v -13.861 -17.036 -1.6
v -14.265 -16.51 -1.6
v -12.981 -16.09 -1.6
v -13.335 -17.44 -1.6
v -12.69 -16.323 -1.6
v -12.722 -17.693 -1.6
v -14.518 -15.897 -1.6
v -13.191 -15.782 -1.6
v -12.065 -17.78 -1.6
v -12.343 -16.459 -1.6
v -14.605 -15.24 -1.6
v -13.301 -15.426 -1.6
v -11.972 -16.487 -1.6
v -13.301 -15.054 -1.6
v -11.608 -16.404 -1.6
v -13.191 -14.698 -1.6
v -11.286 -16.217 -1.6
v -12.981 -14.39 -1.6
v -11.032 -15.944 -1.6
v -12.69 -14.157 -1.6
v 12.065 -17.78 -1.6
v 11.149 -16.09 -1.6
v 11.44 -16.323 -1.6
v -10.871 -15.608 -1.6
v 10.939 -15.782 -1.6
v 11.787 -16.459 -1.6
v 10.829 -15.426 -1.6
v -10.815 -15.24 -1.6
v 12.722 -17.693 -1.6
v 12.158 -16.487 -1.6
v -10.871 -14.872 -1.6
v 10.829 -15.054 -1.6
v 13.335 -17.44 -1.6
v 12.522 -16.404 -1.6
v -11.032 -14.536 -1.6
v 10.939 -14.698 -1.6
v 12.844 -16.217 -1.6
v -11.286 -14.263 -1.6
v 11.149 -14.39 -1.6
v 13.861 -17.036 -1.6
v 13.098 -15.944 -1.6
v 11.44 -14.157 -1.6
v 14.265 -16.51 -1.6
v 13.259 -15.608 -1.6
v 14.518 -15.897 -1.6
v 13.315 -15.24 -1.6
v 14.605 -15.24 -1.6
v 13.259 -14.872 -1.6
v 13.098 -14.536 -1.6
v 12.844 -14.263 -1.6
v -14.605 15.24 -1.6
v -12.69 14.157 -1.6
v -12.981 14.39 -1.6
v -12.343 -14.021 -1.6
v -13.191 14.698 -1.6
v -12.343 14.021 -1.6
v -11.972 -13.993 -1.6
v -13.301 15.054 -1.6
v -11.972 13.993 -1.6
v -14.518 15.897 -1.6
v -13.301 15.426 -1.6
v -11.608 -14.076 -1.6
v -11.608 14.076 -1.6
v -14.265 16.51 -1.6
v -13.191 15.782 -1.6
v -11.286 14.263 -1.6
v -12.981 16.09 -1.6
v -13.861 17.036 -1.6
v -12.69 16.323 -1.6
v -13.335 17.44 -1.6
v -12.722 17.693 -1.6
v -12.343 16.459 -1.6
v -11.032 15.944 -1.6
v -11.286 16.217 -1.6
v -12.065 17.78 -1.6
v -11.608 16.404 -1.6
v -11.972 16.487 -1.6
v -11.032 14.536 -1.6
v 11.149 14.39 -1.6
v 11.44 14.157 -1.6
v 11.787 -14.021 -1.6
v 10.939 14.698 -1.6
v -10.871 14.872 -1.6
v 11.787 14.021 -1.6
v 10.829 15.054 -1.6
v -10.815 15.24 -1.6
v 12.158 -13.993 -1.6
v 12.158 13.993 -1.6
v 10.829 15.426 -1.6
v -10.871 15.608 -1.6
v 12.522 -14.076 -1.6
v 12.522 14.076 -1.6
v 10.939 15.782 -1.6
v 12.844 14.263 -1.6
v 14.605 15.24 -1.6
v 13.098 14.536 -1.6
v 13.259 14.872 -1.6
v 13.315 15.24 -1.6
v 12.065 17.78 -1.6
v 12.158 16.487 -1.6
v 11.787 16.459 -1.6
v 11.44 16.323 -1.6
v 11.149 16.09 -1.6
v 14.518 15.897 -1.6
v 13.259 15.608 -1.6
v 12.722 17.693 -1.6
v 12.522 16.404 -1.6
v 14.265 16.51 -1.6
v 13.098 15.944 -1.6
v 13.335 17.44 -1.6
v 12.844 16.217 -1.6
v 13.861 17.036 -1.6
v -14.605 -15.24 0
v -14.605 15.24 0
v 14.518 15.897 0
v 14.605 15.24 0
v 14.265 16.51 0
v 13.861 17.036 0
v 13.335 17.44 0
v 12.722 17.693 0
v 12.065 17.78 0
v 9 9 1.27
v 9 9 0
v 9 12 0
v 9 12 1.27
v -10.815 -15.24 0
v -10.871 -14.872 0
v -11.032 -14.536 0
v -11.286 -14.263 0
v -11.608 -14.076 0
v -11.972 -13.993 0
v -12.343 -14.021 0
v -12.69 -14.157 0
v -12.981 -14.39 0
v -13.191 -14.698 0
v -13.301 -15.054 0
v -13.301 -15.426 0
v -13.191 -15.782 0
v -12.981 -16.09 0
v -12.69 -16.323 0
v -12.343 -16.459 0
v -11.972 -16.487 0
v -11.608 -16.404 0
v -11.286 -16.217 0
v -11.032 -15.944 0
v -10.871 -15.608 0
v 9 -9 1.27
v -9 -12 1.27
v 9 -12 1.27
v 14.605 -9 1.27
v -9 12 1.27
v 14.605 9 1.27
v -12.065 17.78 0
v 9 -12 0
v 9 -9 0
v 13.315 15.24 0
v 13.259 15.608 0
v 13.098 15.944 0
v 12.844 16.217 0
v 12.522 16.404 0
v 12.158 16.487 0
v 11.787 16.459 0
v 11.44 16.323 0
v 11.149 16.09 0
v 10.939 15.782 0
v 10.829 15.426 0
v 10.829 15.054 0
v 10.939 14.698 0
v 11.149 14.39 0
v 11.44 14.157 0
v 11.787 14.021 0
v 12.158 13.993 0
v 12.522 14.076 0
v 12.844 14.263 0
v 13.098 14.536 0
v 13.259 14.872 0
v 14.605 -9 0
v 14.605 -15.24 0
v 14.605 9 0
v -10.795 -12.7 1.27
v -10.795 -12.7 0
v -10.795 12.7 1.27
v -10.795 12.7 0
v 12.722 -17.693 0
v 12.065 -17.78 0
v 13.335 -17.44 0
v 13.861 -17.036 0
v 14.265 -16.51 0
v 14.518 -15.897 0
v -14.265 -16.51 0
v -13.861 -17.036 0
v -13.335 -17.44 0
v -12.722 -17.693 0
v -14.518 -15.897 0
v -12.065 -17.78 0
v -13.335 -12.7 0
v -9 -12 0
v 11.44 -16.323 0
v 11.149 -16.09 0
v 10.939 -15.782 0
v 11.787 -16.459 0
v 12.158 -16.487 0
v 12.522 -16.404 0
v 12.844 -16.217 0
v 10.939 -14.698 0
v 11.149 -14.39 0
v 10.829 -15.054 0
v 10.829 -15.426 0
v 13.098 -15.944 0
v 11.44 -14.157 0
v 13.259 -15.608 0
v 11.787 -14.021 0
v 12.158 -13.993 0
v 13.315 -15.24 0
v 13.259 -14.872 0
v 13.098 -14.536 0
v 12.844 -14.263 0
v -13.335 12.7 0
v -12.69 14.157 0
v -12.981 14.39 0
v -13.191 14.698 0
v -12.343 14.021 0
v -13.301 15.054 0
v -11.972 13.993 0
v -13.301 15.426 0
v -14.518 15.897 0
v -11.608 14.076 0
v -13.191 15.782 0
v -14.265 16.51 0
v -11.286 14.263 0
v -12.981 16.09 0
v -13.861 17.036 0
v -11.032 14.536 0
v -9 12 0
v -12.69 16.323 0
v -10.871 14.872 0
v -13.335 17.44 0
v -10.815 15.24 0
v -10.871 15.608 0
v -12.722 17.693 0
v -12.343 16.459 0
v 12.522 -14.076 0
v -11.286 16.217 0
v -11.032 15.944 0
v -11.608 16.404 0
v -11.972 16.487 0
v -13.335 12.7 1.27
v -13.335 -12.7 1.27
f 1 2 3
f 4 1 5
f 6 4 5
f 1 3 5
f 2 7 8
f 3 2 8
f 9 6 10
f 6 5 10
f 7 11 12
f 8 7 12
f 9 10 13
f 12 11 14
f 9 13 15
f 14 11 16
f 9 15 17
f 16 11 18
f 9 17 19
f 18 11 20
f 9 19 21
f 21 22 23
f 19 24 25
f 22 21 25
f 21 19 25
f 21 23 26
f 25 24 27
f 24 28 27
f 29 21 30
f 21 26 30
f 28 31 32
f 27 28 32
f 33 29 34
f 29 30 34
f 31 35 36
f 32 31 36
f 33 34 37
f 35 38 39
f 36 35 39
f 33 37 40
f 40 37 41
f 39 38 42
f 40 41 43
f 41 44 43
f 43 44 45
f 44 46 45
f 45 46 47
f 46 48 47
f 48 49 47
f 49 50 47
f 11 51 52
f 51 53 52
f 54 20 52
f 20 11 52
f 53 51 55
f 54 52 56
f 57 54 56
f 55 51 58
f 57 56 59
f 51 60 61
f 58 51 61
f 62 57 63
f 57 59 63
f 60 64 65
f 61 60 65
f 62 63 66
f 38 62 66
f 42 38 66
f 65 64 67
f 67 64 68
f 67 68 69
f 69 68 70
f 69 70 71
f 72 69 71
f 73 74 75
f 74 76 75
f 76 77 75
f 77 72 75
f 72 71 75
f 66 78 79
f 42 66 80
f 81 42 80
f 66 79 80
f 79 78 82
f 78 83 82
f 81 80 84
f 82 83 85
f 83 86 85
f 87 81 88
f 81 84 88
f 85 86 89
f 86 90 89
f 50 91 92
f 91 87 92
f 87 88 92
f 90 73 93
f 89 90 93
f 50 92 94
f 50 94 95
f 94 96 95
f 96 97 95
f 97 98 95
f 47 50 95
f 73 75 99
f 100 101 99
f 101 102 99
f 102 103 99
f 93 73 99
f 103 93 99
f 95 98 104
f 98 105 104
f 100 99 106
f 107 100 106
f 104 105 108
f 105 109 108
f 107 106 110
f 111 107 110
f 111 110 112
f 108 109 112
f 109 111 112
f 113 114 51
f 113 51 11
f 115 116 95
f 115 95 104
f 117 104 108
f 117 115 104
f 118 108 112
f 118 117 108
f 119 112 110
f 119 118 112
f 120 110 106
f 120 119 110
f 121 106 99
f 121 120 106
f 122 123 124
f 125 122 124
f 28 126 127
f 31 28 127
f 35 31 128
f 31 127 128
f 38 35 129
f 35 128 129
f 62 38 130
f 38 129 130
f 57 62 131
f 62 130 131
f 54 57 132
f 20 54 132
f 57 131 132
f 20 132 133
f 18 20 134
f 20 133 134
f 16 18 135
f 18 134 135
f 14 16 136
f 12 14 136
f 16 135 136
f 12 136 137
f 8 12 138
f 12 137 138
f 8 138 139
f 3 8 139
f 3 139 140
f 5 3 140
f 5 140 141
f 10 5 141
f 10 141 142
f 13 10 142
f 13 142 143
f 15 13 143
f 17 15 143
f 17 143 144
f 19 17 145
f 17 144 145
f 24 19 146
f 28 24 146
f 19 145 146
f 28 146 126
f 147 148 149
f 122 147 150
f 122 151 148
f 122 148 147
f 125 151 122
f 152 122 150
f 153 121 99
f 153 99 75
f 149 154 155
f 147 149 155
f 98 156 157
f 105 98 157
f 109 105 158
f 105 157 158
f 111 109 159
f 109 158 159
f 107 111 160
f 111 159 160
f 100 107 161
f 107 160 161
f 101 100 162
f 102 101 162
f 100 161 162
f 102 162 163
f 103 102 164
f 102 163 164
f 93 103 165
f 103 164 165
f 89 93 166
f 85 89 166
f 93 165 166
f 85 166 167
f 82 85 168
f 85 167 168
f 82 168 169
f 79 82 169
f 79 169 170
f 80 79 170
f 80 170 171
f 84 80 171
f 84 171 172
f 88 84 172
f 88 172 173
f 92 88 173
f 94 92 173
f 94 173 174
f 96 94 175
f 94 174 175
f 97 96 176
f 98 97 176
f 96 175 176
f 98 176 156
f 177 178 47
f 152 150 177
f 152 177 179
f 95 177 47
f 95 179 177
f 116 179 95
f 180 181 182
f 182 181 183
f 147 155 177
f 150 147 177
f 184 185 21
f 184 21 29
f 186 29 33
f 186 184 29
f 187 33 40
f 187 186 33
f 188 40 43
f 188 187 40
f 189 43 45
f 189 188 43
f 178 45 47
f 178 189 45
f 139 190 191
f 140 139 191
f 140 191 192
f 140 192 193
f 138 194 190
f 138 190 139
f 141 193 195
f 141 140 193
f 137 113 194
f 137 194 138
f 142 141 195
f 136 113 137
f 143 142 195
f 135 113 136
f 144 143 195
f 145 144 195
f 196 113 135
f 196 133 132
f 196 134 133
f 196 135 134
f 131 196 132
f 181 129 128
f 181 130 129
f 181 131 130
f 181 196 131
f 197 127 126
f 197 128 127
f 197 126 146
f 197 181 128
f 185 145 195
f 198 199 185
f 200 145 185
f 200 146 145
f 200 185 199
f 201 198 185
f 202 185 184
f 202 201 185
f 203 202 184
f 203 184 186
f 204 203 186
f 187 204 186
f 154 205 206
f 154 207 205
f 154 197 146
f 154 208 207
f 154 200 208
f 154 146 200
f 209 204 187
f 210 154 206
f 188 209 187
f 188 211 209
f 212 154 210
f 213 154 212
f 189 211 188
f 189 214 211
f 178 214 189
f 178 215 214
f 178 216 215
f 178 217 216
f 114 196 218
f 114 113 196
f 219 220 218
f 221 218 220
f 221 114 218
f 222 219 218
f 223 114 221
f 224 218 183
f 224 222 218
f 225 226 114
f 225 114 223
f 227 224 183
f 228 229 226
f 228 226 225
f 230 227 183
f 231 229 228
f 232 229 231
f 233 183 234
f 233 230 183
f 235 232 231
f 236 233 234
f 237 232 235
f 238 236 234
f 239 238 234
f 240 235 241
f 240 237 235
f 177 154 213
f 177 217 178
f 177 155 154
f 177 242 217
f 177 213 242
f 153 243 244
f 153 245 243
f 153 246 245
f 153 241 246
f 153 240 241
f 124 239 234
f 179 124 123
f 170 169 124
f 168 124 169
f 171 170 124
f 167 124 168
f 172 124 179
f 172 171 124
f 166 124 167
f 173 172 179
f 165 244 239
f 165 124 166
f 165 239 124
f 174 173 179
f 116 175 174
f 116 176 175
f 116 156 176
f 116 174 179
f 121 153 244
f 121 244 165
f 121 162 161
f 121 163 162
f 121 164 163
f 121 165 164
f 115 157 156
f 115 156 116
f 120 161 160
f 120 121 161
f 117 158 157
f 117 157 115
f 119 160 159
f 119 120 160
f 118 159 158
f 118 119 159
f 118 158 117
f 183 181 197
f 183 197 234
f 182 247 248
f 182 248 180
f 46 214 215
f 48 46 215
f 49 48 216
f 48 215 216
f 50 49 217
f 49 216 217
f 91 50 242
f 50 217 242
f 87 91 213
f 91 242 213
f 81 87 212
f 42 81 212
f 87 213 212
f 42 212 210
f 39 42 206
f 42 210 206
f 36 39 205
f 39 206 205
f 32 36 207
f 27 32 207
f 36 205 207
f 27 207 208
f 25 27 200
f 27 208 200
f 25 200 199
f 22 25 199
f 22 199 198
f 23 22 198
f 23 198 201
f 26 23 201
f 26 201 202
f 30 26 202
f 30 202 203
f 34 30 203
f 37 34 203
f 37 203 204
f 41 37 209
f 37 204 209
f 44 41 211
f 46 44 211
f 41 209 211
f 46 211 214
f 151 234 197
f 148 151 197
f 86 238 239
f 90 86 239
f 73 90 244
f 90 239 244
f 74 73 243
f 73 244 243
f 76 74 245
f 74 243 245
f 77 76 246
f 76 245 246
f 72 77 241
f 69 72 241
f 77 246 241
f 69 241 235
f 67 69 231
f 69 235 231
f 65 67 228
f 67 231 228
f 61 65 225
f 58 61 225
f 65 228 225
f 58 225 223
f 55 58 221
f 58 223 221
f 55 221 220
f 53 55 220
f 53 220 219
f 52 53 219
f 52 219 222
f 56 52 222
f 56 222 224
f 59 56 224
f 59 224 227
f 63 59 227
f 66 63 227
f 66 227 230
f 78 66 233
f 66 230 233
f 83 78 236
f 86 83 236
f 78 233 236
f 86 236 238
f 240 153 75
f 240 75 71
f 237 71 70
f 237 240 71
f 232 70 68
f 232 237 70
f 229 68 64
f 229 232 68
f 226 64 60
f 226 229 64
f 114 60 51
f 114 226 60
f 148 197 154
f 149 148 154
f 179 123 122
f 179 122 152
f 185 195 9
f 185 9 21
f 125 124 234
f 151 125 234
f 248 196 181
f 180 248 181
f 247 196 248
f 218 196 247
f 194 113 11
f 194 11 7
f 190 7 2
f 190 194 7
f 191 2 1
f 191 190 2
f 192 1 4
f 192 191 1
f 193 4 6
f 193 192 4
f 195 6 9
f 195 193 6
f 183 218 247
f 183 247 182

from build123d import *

# Parameters (mm, degrees)
F0_R     = 1.25
F1_DEPTH = 1.6
F2_W     = 2.54
F2_H     = 25.4
F3_DEPTH = 1.27
F4_W     = 5.605
F4_H     = 18
F5_DEPTH = 1.27


with BuildPart() as f1:
    # F0 (on Top) → F1 (new body)
    with BuildSketch(Plane.XY):
        with BuildLine():
            Line((12.065, 17.78), (-12.065, 17.78))
            ThreePointArc((-12.065, 17.78), (-13.861051, 17.036051), (-14.605, 15.24))
            Line((-14.605, 15.24), (-14.605, -15.24))
            ThreePointArc((-14.605, -15.24), (-13.861051, -17.036051), (-12.065, -17.78))
            Line((-12.065, -17.78), (12.065, -17.78))
            ThreePointArc((12.065, -17.78), (13.861051, -17.036051), (14.605, -15.24))
            Line((14.605, -15.24), (14.605, 15.24))
            ThreePointArc((14.605, 15.24), (13.861051, 17.036051), (12.065, 17.78))
        make_face()
        with Locations((-12.065, -15.24)):
            Circle(F0_R, mode=Mode.SUBTRACT)
        with Locations((12.065, -15.24)):
            Circle(F0_R, mode=Mode.SUBTRACT)
        with Locations((-12.065, 15.24)):
            Circle(F0_R, mode=Mode.SUBTRACT)
        with Locations((12.065, 15.24)):
            Circle(F0_R, mode=Mode.SUBTRACT)
    extrude(amount=-F1_DEPTH)

    # F2 (on Top) → F3 (join)
    with BuildSketch(Plane.XY):
        with Locations((-12.065, 0)):
            Rectangle(F2_W, F2_H)
    extrude(amount=F3_DEPTH)

    # F4 (on face) → F5 (join)
    with BuildSketch(Plane.XY):
        Polygon((-9, -12), (9, -12), (9, -9), (9, 9), (9, 12), (-9, 12), align=None)
        with Locations((11.8025, 0)):
            Rectangle(F4_W, F4_H)
    extrude(amount=F5_DEPTH)


solid = f1.part
